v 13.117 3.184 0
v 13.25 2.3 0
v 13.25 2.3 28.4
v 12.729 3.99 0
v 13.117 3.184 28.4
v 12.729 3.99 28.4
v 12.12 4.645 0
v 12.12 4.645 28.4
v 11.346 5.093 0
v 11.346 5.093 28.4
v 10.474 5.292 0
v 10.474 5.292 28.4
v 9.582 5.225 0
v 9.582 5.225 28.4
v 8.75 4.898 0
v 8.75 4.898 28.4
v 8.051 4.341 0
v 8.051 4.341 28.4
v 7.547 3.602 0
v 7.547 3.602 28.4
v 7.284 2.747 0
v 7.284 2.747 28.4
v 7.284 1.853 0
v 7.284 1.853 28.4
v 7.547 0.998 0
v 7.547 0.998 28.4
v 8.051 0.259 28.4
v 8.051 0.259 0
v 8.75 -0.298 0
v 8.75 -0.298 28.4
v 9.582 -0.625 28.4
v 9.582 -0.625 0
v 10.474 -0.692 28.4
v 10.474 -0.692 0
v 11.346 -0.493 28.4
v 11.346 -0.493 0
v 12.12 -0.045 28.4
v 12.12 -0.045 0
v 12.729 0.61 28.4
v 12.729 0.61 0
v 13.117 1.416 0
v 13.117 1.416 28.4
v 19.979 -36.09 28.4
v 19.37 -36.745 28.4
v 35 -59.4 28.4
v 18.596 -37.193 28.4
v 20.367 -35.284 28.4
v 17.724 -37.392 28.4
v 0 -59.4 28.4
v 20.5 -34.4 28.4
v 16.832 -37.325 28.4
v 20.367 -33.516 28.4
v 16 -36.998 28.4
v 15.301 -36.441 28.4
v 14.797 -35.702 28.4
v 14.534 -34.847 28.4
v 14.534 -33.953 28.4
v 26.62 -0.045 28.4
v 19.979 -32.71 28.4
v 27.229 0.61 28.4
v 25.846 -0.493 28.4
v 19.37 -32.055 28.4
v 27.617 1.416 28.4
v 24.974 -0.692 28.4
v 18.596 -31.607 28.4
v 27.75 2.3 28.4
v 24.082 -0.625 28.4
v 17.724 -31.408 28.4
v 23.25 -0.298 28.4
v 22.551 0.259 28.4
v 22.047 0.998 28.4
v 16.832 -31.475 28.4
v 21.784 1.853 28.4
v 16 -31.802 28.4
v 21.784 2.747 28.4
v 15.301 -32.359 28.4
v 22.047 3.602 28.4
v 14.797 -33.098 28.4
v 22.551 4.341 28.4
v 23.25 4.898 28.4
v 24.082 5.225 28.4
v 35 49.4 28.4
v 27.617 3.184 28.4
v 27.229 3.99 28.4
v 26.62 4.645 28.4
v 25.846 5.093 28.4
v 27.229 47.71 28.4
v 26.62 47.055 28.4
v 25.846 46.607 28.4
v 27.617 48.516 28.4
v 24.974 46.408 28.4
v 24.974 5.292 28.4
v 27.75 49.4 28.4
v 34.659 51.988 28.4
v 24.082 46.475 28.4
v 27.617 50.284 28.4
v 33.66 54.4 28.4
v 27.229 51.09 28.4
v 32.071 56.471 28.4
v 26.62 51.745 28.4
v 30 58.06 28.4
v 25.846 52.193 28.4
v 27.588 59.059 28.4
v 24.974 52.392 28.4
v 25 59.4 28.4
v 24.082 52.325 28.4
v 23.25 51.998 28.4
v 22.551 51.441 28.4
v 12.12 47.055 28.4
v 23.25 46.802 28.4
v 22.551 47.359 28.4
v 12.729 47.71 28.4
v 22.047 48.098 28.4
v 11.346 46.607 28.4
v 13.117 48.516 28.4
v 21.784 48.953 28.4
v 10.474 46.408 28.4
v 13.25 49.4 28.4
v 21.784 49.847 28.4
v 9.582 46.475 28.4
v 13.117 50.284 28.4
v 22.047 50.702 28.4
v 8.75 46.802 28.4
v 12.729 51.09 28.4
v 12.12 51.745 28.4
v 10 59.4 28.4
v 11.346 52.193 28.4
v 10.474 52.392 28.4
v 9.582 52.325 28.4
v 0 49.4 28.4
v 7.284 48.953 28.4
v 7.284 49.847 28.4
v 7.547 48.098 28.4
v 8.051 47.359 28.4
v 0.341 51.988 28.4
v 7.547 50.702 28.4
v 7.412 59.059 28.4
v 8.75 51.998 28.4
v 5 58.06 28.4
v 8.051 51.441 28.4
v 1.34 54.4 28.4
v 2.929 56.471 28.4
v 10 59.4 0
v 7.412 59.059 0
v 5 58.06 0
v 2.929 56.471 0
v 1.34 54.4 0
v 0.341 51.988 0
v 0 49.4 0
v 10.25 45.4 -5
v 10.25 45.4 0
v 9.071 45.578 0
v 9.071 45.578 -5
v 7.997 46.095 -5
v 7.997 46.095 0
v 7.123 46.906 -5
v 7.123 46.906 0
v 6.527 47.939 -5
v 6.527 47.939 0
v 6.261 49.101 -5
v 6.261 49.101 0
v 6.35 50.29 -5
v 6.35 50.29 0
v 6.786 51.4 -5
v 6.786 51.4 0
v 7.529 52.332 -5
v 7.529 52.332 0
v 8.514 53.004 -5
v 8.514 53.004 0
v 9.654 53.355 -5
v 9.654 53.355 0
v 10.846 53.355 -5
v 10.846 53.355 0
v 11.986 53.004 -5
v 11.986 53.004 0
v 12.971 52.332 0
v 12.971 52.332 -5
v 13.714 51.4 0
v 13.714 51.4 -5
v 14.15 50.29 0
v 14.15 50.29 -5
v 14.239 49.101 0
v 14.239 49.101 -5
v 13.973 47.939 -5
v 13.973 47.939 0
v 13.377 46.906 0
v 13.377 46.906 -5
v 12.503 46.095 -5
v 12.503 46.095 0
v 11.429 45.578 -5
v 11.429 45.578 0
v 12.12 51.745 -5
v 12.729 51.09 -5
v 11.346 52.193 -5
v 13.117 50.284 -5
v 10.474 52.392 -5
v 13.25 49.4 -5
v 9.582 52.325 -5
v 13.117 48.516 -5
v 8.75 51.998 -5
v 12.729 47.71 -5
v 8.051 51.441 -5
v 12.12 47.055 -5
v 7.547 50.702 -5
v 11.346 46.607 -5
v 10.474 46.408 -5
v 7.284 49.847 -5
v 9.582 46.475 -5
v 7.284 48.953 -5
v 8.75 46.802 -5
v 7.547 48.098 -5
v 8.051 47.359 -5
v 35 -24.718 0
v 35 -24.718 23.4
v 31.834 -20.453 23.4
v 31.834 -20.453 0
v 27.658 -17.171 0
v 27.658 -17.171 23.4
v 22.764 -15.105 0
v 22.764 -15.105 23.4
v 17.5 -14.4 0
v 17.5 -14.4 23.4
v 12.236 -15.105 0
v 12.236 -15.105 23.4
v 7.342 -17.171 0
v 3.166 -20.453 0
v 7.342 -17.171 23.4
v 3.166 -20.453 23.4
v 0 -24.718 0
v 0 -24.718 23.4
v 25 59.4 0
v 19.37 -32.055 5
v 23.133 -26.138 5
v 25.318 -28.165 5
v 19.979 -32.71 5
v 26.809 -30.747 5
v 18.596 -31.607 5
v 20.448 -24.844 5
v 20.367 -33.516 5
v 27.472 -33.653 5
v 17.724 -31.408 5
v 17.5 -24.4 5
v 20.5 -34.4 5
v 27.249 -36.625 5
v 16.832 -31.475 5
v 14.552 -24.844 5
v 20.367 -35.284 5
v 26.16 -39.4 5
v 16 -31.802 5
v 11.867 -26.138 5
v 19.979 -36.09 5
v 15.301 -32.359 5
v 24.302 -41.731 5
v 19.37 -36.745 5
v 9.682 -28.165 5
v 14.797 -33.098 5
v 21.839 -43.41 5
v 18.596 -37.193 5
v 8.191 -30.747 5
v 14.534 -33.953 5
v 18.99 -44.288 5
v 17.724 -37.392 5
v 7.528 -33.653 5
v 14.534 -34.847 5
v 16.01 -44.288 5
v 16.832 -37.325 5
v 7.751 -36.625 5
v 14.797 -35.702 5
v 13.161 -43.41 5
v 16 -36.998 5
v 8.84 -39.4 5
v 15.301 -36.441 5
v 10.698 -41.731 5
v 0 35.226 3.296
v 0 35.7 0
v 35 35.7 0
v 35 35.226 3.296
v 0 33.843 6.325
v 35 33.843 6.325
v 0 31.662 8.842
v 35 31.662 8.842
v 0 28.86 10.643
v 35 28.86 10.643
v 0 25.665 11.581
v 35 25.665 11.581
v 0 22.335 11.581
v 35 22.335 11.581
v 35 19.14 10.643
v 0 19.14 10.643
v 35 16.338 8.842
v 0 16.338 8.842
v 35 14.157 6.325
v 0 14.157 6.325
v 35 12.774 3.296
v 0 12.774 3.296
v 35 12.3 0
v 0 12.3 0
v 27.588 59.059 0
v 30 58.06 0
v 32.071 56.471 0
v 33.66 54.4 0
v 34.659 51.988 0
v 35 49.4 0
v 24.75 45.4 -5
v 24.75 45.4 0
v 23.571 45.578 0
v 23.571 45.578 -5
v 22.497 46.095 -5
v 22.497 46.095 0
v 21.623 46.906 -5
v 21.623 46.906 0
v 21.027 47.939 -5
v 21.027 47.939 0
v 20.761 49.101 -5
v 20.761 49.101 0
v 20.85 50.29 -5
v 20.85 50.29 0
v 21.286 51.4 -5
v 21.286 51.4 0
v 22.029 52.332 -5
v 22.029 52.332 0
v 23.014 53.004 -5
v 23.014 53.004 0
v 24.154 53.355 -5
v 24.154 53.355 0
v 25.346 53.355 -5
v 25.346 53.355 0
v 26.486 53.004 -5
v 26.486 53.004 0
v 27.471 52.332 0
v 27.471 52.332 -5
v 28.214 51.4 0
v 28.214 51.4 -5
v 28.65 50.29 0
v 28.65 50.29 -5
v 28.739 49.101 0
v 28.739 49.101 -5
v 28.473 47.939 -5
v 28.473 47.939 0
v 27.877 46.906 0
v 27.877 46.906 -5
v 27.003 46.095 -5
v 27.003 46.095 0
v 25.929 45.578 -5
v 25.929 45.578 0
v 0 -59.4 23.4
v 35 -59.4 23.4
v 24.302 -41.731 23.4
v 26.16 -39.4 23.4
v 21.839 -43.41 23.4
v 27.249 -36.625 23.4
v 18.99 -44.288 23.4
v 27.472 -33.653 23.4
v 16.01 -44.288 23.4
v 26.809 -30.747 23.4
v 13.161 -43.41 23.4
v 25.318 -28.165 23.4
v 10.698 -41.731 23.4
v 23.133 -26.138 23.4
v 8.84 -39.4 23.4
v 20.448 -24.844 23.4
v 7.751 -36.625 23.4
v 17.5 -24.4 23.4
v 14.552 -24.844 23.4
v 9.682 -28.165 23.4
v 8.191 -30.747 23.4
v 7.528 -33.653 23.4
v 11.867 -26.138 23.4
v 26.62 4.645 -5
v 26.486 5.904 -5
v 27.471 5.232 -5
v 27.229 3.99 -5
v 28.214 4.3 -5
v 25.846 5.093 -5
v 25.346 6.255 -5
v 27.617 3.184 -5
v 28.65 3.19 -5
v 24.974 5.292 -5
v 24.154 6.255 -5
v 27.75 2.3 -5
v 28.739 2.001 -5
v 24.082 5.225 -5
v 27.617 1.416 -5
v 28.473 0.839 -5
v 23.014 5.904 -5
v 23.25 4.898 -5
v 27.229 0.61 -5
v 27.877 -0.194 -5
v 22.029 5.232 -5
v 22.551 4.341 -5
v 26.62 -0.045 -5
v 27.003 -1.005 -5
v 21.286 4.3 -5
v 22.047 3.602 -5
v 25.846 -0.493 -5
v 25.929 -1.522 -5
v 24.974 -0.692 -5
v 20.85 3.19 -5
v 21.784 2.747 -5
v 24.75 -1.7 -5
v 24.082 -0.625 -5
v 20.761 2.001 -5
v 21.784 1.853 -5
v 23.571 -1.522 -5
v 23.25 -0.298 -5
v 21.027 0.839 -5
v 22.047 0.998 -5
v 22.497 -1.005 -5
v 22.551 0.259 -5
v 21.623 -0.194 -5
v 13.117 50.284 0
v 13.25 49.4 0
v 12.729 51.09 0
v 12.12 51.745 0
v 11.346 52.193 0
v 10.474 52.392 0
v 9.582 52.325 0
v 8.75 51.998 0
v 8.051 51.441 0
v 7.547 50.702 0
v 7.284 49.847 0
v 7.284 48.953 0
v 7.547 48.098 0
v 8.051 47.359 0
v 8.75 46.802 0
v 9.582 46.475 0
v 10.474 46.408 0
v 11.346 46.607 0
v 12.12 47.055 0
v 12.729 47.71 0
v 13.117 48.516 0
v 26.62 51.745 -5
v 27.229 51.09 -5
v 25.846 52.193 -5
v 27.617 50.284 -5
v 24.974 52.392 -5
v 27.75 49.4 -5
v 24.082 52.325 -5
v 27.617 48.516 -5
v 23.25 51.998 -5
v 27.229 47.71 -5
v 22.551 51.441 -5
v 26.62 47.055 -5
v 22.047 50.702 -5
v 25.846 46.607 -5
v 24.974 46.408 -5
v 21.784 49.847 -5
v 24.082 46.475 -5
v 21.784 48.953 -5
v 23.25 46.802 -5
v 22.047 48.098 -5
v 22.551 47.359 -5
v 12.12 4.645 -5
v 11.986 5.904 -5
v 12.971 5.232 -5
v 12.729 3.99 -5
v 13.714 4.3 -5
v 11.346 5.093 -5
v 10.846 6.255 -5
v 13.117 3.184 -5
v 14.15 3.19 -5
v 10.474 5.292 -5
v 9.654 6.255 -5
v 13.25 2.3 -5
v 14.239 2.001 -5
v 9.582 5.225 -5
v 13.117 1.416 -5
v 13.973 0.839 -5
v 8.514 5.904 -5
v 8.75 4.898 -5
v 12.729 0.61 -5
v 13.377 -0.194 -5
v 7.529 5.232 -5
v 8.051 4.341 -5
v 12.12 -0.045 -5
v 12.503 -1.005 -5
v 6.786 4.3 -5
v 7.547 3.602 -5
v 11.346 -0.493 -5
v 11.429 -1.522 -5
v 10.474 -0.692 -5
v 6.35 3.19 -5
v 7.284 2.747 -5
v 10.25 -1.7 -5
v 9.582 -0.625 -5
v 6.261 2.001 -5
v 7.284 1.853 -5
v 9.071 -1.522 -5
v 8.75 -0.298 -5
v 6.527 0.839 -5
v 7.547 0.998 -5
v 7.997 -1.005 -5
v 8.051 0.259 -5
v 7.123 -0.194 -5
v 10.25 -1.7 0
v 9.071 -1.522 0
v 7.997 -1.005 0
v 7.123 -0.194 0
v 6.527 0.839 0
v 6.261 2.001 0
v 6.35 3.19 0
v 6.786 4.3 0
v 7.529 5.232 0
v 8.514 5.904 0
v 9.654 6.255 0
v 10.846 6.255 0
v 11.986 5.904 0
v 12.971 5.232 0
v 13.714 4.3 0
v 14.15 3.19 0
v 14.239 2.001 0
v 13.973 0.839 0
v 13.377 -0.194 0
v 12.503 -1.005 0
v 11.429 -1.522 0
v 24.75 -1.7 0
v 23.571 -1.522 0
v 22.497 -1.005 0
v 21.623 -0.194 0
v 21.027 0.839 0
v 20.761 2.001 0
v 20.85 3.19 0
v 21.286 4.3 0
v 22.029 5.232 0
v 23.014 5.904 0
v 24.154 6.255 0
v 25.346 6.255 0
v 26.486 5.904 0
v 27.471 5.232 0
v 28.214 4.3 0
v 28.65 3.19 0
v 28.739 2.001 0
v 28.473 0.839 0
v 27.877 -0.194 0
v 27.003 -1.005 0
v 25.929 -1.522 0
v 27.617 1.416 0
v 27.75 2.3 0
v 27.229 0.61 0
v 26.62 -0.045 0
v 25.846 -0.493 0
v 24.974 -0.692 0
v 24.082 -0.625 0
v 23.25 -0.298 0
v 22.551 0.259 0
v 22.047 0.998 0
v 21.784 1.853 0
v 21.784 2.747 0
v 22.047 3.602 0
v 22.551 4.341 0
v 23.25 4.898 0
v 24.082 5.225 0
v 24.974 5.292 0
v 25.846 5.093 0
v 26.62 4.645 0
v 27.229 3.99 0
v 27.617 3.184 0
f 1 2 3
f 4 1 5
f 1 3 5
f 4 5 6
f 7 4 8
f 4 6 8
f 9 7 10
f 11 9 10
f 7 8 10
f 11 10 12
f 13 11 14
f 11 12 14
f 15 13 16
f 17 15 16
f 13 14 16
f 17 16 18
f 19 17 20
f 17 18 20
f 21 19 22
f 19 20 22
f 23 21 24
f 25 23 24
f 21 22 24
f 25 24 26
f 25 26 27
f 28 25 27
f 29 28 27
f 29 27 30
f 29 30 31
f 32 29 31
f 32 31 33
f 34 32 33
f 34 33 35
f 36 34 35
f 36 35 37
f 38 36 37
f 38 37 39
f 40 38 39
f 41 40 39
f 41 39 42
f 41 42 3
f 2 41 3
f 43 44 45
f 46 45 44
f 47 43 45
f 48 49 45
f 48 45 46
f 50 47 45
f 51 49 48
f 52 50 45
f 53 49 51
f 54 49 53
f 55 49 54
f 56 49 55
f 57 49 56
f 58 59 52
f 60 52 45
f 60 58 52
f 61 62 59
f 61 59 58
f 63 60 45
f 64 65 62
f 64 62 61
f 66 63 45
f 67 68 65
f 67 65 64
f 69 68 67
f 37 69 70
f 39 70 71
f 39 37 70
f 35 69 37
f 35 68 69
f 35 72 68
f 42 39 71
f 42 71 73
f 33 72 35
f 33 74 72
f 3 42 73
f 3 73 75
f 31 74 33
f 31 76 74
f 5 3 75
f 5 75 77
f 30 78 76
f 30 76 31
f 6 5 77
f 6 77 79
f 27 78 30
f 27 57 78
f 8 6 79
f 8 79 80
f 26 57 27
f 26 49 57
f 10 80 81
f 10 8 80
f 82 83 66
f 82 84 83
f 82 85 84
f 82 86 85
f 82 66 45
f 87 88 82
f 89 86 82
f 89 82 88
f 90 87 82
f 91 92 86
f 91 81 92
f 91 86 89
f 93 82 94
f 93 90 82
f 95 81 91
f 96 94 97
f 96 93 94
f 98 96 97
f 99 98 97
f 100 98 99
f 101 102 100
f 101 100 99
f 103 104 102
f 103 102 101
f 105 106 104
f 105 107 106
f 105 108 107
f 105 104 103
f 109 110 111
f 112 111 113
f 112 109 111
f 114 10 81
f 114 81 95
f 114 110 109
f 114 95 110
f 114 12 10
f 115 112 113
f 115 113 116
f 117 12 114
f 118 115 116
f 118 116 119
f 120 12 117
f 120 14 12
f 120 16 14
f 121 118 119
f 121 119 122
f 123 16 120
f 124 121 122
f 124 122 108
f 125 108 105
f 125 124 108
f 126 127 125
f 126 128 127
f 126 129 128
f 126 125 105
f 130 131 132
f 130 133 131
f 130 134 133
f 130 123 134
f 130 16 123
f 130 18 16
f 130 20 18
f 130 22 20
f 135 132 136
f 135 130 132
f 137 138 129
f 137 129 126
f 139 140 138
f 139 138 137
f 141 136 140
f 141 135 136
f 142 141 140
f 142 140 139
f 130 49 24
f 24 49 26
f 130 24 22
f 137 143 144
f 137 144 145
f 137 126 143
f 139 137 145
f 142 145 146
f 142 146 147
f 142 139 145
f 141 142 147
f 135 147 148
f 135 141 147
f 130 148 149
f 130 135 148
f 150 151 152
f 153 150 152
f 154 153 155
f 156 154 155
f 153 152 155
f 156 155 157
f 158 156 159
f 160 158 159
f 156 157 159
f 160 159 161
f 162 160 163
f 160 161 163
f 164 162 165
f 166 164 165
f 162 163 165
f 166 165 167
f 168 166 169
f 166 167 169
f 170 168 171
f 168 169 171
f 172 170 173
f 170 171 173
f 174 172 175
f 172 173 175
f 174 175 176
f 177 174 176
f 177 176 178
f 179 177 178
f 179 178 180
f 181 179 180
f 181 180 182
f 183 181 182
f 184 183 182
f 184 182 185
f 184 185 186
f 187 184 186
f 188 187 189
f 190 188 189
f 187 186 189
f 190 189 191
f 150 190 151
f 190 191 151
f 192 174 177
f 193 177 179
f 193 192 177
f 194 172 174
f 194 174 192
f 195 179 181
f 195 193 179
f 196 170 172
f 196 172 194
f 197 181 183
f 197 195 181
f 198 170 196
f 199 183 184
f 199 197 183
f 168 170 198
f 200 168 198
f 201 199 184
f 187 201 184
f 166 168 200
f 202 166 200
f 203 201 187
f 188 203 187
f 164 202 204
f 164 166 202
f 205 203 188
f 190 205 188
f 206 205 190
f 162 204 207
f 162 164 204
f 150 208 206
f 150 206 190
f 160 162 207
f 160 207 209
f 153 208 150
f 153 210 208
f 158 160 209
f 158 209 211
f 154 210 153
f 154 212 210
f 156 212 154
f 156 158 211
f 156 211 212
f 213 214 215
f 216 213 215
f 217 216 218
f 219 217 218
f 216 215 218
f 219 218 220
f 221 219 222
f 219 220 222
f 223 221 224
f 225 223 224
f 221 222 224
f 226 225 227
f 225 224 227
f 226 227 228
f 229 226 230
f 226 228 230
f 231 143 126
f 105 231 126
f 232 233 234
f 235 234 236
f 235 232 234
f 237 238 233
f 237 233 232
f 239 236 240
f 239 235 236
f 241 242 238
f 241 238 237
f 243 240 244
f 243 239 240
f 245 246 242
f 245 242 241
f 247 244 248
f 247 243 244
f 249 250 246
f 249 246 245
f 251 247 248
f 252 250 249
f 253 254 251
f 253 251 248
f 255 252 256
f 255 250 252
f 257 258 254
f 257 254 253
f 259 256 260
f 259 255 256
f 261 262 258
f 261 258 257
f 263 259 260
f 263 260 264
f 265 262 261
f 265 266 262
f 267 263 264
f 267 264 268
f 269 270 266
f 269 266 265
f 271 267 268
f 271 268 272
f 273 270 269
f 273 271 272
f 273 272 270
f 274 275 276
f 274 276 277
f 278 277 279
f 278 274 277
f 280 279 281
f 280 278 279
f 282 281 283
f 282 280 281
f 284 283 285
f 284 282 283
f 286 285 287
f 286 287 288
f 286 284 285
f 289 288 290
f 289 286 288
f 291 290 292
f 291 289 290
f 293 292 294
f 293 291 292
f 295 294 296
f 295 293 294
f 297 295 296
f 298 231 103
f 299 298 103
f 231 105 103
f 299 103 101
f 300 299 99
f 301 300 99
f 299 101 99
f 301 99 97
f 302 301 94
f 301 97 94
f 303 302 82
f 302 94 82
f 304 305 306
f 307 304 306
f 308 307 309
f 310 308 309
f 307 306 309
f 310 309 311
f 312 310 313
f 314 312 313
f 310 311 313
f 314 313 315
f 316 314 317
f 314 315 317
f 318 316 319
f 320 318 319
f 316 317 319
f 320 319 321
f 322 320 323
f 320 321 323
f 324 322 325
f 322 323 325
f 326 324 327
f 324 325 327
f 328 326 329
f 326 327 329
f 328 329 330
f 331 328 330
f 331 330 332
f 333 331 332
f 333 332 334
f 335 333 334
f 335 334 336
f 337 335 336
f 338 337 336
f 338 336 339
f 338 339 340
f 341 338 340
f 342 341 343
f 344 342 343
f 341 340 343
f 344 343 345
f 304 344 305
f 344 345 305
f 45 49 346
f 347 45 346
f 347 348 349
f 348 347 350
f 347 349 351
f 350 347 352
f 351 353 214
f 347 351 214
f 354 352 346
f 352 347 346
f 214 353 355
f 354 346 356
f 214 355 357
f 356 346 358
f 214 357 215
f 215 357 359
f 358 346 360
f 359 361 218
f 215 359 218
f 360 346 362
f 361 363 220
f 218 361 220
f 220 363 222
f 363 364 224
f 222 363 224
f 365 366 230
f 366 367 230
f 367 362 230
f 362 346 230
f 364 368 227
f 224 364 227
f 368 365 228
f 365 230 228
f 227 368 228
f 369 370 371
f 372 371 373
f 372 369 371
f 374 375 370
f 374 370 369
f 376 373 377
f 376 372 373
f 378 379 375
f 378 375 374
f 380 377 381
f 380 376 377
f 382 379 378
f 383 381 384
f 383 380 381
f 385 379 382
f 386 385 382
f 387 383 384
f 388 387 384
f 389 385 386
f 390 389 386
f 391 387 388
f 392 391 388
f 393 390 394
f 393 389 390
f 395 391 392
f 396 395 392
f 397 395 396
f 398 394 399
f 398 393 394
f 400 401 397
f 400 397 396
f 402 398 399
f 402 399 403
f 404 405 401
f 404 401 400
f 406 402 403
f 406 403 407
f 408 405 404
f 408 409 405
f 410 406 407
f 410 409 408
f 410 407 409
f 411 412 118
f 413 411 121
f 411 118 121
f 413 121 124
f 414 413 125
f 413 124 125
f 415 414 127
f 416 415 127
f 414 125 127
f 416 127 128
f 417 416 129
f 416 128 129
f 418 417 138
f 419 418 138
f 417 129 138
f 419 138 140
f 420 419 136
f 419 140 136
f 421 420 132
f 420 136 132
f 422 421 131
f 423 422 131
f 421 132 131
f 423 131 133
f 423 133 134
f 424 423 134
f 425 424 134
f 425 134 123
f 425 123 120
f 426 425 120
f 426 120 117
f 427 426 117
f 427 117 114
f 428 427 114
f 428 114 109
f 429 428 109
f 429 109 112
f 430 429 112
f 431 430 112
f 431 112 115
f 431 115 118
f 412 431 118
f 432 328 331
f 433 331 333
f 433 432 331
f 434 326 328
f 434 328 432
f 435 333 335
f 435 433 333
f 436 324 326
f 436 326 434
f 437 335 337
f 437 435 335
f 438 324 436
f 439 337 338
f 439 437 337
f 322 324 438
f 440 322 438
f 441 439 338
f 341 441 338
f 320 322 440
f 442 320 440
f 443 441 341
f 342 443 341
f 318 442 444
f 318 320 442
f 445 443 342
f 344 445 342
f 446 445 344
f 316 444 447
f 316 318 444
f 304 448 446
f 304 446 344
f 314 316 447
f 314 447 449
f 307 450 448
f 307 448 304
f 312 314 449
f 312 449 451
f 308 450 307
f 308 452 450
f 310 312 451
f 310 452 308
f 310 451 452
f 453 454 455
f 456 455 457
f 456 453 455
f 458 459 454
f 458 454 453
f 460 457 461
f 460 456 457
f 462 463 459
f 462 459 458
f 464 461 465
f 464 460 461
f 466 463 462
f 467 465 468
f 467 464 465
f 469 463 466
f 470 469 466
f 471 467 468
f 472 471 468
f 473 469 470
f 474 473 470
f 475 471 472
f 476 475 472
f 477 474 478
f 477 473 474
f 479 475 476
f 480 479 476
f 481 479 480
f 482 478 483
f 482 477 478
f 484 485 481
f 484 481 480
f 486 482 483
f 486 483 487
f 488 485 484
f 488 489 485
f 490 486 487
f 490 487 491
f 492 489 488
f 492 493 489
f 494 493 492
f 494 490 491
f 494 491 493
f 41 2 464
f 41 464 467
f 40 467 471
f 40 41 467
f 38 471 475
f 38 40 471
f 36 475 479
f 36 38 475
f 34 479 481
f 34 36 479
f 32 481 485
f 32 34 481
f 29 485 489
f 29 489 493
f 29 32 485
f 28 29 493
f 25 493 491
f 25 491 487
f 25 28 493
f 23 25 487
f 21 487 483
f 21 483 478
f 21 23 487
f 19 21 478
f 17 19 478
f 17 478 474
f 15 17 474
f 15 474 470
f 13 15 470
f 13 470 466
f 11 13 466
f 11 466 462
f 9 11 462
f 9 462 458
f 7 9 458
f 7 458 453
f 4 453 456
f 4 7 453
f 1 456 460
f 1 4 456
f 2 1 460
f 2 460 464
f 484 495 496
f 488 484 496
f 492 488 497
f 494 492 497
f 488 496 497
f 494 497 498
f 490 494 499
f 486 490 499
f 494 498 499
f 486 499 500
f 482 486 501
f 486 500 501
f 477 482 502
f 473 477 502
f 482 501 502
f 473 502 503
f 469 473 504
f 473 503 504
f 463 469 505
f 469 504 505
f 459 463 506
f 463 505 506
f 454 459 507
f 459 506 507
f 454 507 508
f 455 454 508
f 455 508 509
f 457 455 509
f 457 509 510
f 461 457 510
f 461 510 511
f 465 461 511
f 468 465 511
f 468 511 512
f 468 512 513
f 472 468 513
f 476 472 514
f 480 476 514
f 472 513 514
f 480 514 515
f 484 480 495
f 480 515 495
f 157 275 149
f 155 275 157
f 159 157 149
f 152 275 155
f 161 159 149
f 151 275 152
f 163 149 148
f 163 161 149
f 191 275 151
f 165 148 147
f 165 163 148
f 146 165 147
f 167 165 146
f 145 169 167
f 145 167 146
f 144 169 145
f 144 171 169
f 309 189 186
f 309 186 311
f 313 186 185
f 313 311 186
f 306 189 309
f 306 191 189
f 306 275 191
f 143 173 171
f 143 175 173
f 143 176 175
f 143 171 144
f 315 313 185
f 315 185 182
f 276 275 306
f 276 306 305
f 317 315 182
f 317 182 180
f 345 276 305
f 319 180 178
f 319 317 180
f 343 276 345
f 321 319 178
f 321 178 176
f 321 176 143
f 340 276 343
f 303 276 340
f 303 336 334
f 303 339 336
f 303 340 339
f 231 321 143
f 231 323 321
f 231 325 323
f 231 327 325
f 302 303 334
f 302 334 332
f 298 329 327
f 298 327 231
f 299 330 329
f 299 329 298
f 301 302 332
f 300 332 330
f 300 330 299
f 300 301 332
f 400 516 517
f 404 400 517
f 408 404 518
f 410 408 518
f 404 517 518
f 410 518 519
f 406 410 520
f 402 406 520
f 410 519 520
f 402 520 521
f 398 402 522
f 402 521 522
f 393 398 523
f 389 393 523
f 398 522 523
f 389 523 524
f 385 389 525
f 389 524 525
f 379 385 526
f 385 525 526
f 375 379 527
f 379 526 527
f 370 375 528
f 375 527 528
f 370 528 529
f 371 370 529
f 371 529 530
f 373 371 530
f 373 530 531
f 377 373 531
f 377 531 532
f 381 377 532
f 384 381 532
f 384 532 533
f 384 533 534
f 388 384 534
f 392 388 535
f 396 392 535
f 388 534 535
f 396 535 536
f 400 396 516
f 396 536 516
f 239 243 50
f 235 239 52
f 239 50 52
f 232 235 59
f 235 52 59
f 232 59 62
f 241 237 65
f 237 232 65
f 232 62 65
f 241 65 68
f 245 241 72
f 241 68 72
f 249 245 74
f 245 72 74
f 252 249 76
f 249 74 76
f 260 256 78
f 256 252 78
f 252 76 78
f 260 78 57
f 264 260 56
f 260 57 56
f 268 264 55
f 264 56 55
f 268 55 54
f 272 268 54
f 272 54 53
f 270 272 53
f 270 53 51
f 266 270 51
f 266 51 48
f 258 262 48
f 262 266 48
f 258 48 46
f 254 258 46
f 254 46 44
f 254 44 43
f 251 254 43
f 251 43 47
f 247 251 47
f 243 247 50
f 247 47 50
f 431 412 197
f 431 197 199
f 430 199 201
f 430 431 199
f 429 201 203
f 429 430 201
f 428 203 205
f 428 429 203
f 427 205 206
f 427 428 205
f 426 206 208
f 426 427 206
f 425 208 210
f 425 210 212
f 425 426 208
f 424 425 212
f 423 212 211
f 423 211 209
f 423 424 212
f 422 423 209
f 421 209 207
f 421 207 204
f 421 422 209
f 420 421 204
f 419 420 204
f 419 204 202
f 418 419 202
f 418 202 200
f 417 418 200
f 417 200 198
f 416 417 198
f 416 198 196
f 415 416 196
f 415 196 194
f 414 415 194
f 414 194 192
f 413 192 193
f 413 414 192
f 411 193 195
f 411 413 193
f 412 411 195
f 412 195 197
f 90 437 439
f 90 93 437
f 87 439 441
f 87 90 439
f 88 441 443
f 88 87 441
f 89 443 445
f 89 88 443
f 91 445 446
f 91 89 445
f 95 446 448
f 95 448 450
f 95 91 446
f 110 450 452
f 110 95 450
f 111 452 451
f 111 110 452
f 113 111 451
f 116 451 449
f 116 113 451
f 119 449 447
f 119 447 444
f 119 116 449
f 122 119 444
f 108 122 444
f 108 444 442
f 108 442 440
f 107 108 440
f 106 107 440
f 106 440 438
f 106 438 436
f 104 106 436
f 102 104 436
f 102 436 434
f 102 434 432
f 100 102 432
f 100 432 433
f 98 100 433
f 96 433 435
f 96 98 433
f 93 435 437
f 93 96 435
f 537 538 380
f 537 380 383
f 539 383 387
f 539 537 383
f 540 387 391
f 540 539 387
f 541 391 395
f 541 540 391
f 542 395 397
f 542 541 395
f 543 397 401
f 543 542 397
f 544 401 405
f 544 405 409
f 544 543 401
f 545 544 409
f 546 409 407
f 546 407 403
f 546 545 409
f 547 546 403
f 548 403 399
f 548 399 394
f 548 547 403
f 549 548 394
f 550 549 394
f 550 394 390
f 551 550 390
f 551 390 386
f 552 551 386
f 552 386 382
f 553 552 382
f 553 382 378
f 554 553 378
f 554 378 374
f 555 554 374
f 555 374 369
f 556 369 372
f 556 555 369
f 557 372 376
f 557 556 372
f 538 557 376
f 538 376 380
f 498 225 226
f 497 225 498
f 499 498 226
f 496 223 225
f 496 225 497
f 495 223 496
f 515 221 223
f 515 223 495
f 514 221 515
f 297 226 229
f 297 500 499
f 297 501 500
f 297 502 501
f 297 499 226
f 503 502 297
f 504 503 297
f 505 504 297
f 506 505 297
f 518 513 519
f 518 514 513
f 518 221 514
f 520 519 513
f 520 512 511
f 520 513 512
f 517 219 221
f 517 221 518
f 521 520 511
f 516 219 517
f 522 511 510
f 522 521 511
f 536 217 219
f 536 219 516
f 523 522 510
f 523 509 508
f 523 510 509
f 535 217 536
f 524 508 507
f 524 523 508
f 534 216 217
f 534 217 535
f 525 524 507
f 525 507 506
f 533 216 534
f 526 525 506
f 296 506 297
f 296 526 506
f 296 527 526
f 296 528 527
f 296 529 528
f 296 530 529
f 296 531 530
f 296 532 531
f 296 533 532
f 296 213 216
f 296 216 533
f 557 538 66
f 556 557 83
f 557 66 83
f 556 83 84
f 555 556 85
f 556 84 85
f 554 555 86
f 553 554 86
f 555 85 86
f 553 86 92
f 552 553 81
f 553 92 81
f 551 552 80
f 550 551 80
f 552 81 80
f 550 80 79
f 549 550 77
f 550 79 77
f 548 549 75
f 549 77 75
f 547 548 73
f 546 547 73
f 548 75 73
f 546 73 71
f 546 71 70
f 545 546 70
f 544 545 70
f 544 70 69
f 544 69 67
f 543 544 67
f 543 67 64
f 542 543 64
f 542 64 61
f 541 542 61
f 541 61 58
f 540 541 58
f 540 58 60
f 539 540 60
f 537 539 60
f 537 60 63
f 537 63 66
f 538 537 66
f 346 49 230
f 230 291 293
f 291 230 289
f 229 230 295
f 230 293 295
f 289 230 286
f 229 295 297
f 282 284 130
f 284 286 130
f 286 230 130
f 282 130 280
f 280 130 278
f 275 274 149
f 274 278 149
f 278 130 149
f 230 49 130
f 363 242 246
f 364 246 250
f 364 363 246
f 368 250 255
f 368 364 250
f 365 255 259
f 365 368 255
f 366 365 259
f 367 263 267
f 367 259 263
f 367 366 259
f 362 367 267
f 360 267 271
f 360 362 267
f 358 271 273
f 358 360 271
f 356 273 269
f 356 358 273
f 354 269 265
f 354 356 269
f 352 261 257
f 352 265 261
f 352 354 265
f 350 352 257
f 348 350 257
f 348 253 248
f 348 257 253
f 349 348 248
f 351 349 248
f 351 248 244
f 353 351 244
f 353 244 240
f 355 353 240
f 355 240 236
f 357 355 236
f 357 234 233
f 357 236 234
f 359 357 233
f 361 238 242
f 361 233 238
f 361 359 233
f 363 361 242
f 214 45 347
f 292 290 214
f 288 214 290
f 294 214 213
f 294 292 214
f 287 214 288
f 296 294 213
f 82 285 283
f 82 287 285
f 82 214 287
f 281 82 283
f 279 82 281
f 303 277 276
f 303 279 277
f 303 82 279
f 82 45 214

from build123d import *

# Parameters (mm, degrees)
SKETCH1_R               = 11.7
BOSS_EXTRUDE1_DEPTH     = 35
SKETCH2_R               = 10
BOSS_EXTRUDE3_DEPTH     = 51.8
SKETCH3_R               = 3
CUT_EXTRUDE1_DEPTH      = 90.32860684
CUT_EXTRUDE1_DEPTH_BACK = 90.32860684
SKETCH6_W               = 28.4
SKETCH6_H               = 118.8
CUT_EXTRUDE3_DEPTH      = 75.564871086
SKETCH8_R               = 10
SKETCH8_R_2             = 3
CUT_EXTRUDE4_DEPTH      = 5
SKETCH7_R               = 4
SKETCH7_R_2             = 3
BOSS_EXTRUDE4_DEPTH     = 5
FILLET1_R               = 10


with BuildPart() as part:
    # Sketch1 → Boss-Extrude1 (new body)
    with BuildSketch(Plane(origin=(0, 0, 0), x_dir=(0, 0, -1), z_dir=(1, 0, 0))):
        Polygon((-28.4, -59.4), (-23.4, -59.4), (-23.4, -14.4), (23.4, -14.4), (23.4, -59.4), (28.4, -59.4), (28.4, 59.4), (-28.4, 59.4), align=None)
        with Locations((0, 24)):
            Circle(SKETCH1_R, mode=Mode.SUBTRACT)
    extrude(amount=BOSS_EXTRUDE1_DEPTH)

    # Sketch2 → Boss-Extrude3 (add)
    with BuildSketch(Plane.XY.offset(28.4)):
        with Locations(Location((17.5, -34.4, 0), (0, 0, 90))):
            Circle(SKETCH2_R)
        with BuildLine():
            Line((0, -24.717541634), (0, -13.4))
            Line((0, -13.4), (35, -13.4))
            Line((35, -13.4), (35, -24.717541634))
            ThreePointArc((35, -24.717541634), (17.5, -14.4), (0, -24.717541634))
        make_face()
    extrude(amount=-BOSS_EXTRUDE3_DEPTH)

    # Sketch3 → Cut-Extrude1 (cut, two sides)
    with BuildSketch(Plane.XY.offset(28.4)) as cut_extrude1_sk:
        with Locations((10.25, 49.4)):
            Circle(SKETCH3_R)
        with Locations((17.5, -34.4)):
            Circle(SKETCH3_R)
        with Locations((10.25, 2.3)):
            Circle(SKETCH3_R)
        with Locations((24.75, 2.3)):
            Circle(SKETCH3_R)
        with Locations((24.75, 49.4)):
            Circle(SKETCH3_R)
    extrude(amount=CUT_EXTRUDE1_DEPTH, mode=Mode.SUBTRACT)
    extrude(cut_extrude1_sk.sketch, amount=-CUT_EXTRUDE1_DEPTH_BACK, mode=Mode.SUBTRACT)

    # Sketch6 → Cut-Extrude3 (cut, through all)
    with BuildSketch(Plane(origin=(35, 0, 0), x_dir=(0, 0, -1), z_dir=(1, 0, 0))):
        with Locations((14.2, 0)):
            Rectangle(SKETCH6_W, SKETCH6_H)
    extrude(amount=-CUT_EXTRUDE3_DEPTH, mode=Mode.SUBTRACT)

    # Sketch8 → Cut-Extrude4 (cut)
    with BuildSketch(Plane(origin=(0, 0, 0), x_dir=(-1, 0, 0), z_dir=(0, 0, -1))):
        with Locations(Location((-17.5, -34.4, 0), (0, 0, 270))):
            Circle(SKETCH8_R)
        with Locations(Location((-17.5, -34.4, 0), (0, 0, 180))):
            Circle(SKETCH8_R_2, mode=Mode.SUBTRACT)
    extrude(amount=-CUT_EXTRUDE4_DEPTH, mode=Mode.SUBTRACT)

    # Sketch7 → Boss-Extrude4 (add)
    with BuildSketch(Plane(origin=(0, 0, 0), x_dir=(-1, 0, 0), z_dir=(0, 0, -1))):
        with Locations(Location((-24.75, 49.4, 0), (0, 0, 270))):
            Circle(SKETCH7_R)
        with Locations(Location((-24.75, 49.4, 0), (0, 0, 180))):
            Circle(SKETCH7_R_2, mode=Mode.SUBTRACT)
        with Locations(Location((-10.25, 49.4, 0), (0, 0, 270))):
            Circle(SKETCH7_R)
        with Locations(Location((-10.25, 49.4, 0), (0, 0, 180))):
            Circle(SKETCH7_R_2, mode=Mode.SUBTRACT)
        with Locations(Location((-24.75, 2.3, 0), (0, 0, 270))):
            Circle(SKETCH7_R)
        with Locations(Location((-24.75, 2.3, 0), (0, 0, 180))):
            Circle(SKETCH7_R_2, mode=Mode.SUBTRACT)
        with Locations(Location((-10.25, 2.3, 0), (0, 0, 270))):
            Circle(SKETCH7_R)
        with Locations(Location((-10.25, 2.3, 0), (0, 0, 180))):
            Circle(SKETCH7_R_2, mode=Mode.SUBTRACT)
    extrude(amount=BOSS_EXTRUDE4_DEPTH)

    # Fillet1
    fillet1_edges = [part.edges().sort_by_distance(p)[0] for p in [
        (0, 59.4, 14.2),
        (35, 59.4, 14.2),
    ]]
    fillet(fillet1_edges, radius=FILLET1_R)


solid = part.part
